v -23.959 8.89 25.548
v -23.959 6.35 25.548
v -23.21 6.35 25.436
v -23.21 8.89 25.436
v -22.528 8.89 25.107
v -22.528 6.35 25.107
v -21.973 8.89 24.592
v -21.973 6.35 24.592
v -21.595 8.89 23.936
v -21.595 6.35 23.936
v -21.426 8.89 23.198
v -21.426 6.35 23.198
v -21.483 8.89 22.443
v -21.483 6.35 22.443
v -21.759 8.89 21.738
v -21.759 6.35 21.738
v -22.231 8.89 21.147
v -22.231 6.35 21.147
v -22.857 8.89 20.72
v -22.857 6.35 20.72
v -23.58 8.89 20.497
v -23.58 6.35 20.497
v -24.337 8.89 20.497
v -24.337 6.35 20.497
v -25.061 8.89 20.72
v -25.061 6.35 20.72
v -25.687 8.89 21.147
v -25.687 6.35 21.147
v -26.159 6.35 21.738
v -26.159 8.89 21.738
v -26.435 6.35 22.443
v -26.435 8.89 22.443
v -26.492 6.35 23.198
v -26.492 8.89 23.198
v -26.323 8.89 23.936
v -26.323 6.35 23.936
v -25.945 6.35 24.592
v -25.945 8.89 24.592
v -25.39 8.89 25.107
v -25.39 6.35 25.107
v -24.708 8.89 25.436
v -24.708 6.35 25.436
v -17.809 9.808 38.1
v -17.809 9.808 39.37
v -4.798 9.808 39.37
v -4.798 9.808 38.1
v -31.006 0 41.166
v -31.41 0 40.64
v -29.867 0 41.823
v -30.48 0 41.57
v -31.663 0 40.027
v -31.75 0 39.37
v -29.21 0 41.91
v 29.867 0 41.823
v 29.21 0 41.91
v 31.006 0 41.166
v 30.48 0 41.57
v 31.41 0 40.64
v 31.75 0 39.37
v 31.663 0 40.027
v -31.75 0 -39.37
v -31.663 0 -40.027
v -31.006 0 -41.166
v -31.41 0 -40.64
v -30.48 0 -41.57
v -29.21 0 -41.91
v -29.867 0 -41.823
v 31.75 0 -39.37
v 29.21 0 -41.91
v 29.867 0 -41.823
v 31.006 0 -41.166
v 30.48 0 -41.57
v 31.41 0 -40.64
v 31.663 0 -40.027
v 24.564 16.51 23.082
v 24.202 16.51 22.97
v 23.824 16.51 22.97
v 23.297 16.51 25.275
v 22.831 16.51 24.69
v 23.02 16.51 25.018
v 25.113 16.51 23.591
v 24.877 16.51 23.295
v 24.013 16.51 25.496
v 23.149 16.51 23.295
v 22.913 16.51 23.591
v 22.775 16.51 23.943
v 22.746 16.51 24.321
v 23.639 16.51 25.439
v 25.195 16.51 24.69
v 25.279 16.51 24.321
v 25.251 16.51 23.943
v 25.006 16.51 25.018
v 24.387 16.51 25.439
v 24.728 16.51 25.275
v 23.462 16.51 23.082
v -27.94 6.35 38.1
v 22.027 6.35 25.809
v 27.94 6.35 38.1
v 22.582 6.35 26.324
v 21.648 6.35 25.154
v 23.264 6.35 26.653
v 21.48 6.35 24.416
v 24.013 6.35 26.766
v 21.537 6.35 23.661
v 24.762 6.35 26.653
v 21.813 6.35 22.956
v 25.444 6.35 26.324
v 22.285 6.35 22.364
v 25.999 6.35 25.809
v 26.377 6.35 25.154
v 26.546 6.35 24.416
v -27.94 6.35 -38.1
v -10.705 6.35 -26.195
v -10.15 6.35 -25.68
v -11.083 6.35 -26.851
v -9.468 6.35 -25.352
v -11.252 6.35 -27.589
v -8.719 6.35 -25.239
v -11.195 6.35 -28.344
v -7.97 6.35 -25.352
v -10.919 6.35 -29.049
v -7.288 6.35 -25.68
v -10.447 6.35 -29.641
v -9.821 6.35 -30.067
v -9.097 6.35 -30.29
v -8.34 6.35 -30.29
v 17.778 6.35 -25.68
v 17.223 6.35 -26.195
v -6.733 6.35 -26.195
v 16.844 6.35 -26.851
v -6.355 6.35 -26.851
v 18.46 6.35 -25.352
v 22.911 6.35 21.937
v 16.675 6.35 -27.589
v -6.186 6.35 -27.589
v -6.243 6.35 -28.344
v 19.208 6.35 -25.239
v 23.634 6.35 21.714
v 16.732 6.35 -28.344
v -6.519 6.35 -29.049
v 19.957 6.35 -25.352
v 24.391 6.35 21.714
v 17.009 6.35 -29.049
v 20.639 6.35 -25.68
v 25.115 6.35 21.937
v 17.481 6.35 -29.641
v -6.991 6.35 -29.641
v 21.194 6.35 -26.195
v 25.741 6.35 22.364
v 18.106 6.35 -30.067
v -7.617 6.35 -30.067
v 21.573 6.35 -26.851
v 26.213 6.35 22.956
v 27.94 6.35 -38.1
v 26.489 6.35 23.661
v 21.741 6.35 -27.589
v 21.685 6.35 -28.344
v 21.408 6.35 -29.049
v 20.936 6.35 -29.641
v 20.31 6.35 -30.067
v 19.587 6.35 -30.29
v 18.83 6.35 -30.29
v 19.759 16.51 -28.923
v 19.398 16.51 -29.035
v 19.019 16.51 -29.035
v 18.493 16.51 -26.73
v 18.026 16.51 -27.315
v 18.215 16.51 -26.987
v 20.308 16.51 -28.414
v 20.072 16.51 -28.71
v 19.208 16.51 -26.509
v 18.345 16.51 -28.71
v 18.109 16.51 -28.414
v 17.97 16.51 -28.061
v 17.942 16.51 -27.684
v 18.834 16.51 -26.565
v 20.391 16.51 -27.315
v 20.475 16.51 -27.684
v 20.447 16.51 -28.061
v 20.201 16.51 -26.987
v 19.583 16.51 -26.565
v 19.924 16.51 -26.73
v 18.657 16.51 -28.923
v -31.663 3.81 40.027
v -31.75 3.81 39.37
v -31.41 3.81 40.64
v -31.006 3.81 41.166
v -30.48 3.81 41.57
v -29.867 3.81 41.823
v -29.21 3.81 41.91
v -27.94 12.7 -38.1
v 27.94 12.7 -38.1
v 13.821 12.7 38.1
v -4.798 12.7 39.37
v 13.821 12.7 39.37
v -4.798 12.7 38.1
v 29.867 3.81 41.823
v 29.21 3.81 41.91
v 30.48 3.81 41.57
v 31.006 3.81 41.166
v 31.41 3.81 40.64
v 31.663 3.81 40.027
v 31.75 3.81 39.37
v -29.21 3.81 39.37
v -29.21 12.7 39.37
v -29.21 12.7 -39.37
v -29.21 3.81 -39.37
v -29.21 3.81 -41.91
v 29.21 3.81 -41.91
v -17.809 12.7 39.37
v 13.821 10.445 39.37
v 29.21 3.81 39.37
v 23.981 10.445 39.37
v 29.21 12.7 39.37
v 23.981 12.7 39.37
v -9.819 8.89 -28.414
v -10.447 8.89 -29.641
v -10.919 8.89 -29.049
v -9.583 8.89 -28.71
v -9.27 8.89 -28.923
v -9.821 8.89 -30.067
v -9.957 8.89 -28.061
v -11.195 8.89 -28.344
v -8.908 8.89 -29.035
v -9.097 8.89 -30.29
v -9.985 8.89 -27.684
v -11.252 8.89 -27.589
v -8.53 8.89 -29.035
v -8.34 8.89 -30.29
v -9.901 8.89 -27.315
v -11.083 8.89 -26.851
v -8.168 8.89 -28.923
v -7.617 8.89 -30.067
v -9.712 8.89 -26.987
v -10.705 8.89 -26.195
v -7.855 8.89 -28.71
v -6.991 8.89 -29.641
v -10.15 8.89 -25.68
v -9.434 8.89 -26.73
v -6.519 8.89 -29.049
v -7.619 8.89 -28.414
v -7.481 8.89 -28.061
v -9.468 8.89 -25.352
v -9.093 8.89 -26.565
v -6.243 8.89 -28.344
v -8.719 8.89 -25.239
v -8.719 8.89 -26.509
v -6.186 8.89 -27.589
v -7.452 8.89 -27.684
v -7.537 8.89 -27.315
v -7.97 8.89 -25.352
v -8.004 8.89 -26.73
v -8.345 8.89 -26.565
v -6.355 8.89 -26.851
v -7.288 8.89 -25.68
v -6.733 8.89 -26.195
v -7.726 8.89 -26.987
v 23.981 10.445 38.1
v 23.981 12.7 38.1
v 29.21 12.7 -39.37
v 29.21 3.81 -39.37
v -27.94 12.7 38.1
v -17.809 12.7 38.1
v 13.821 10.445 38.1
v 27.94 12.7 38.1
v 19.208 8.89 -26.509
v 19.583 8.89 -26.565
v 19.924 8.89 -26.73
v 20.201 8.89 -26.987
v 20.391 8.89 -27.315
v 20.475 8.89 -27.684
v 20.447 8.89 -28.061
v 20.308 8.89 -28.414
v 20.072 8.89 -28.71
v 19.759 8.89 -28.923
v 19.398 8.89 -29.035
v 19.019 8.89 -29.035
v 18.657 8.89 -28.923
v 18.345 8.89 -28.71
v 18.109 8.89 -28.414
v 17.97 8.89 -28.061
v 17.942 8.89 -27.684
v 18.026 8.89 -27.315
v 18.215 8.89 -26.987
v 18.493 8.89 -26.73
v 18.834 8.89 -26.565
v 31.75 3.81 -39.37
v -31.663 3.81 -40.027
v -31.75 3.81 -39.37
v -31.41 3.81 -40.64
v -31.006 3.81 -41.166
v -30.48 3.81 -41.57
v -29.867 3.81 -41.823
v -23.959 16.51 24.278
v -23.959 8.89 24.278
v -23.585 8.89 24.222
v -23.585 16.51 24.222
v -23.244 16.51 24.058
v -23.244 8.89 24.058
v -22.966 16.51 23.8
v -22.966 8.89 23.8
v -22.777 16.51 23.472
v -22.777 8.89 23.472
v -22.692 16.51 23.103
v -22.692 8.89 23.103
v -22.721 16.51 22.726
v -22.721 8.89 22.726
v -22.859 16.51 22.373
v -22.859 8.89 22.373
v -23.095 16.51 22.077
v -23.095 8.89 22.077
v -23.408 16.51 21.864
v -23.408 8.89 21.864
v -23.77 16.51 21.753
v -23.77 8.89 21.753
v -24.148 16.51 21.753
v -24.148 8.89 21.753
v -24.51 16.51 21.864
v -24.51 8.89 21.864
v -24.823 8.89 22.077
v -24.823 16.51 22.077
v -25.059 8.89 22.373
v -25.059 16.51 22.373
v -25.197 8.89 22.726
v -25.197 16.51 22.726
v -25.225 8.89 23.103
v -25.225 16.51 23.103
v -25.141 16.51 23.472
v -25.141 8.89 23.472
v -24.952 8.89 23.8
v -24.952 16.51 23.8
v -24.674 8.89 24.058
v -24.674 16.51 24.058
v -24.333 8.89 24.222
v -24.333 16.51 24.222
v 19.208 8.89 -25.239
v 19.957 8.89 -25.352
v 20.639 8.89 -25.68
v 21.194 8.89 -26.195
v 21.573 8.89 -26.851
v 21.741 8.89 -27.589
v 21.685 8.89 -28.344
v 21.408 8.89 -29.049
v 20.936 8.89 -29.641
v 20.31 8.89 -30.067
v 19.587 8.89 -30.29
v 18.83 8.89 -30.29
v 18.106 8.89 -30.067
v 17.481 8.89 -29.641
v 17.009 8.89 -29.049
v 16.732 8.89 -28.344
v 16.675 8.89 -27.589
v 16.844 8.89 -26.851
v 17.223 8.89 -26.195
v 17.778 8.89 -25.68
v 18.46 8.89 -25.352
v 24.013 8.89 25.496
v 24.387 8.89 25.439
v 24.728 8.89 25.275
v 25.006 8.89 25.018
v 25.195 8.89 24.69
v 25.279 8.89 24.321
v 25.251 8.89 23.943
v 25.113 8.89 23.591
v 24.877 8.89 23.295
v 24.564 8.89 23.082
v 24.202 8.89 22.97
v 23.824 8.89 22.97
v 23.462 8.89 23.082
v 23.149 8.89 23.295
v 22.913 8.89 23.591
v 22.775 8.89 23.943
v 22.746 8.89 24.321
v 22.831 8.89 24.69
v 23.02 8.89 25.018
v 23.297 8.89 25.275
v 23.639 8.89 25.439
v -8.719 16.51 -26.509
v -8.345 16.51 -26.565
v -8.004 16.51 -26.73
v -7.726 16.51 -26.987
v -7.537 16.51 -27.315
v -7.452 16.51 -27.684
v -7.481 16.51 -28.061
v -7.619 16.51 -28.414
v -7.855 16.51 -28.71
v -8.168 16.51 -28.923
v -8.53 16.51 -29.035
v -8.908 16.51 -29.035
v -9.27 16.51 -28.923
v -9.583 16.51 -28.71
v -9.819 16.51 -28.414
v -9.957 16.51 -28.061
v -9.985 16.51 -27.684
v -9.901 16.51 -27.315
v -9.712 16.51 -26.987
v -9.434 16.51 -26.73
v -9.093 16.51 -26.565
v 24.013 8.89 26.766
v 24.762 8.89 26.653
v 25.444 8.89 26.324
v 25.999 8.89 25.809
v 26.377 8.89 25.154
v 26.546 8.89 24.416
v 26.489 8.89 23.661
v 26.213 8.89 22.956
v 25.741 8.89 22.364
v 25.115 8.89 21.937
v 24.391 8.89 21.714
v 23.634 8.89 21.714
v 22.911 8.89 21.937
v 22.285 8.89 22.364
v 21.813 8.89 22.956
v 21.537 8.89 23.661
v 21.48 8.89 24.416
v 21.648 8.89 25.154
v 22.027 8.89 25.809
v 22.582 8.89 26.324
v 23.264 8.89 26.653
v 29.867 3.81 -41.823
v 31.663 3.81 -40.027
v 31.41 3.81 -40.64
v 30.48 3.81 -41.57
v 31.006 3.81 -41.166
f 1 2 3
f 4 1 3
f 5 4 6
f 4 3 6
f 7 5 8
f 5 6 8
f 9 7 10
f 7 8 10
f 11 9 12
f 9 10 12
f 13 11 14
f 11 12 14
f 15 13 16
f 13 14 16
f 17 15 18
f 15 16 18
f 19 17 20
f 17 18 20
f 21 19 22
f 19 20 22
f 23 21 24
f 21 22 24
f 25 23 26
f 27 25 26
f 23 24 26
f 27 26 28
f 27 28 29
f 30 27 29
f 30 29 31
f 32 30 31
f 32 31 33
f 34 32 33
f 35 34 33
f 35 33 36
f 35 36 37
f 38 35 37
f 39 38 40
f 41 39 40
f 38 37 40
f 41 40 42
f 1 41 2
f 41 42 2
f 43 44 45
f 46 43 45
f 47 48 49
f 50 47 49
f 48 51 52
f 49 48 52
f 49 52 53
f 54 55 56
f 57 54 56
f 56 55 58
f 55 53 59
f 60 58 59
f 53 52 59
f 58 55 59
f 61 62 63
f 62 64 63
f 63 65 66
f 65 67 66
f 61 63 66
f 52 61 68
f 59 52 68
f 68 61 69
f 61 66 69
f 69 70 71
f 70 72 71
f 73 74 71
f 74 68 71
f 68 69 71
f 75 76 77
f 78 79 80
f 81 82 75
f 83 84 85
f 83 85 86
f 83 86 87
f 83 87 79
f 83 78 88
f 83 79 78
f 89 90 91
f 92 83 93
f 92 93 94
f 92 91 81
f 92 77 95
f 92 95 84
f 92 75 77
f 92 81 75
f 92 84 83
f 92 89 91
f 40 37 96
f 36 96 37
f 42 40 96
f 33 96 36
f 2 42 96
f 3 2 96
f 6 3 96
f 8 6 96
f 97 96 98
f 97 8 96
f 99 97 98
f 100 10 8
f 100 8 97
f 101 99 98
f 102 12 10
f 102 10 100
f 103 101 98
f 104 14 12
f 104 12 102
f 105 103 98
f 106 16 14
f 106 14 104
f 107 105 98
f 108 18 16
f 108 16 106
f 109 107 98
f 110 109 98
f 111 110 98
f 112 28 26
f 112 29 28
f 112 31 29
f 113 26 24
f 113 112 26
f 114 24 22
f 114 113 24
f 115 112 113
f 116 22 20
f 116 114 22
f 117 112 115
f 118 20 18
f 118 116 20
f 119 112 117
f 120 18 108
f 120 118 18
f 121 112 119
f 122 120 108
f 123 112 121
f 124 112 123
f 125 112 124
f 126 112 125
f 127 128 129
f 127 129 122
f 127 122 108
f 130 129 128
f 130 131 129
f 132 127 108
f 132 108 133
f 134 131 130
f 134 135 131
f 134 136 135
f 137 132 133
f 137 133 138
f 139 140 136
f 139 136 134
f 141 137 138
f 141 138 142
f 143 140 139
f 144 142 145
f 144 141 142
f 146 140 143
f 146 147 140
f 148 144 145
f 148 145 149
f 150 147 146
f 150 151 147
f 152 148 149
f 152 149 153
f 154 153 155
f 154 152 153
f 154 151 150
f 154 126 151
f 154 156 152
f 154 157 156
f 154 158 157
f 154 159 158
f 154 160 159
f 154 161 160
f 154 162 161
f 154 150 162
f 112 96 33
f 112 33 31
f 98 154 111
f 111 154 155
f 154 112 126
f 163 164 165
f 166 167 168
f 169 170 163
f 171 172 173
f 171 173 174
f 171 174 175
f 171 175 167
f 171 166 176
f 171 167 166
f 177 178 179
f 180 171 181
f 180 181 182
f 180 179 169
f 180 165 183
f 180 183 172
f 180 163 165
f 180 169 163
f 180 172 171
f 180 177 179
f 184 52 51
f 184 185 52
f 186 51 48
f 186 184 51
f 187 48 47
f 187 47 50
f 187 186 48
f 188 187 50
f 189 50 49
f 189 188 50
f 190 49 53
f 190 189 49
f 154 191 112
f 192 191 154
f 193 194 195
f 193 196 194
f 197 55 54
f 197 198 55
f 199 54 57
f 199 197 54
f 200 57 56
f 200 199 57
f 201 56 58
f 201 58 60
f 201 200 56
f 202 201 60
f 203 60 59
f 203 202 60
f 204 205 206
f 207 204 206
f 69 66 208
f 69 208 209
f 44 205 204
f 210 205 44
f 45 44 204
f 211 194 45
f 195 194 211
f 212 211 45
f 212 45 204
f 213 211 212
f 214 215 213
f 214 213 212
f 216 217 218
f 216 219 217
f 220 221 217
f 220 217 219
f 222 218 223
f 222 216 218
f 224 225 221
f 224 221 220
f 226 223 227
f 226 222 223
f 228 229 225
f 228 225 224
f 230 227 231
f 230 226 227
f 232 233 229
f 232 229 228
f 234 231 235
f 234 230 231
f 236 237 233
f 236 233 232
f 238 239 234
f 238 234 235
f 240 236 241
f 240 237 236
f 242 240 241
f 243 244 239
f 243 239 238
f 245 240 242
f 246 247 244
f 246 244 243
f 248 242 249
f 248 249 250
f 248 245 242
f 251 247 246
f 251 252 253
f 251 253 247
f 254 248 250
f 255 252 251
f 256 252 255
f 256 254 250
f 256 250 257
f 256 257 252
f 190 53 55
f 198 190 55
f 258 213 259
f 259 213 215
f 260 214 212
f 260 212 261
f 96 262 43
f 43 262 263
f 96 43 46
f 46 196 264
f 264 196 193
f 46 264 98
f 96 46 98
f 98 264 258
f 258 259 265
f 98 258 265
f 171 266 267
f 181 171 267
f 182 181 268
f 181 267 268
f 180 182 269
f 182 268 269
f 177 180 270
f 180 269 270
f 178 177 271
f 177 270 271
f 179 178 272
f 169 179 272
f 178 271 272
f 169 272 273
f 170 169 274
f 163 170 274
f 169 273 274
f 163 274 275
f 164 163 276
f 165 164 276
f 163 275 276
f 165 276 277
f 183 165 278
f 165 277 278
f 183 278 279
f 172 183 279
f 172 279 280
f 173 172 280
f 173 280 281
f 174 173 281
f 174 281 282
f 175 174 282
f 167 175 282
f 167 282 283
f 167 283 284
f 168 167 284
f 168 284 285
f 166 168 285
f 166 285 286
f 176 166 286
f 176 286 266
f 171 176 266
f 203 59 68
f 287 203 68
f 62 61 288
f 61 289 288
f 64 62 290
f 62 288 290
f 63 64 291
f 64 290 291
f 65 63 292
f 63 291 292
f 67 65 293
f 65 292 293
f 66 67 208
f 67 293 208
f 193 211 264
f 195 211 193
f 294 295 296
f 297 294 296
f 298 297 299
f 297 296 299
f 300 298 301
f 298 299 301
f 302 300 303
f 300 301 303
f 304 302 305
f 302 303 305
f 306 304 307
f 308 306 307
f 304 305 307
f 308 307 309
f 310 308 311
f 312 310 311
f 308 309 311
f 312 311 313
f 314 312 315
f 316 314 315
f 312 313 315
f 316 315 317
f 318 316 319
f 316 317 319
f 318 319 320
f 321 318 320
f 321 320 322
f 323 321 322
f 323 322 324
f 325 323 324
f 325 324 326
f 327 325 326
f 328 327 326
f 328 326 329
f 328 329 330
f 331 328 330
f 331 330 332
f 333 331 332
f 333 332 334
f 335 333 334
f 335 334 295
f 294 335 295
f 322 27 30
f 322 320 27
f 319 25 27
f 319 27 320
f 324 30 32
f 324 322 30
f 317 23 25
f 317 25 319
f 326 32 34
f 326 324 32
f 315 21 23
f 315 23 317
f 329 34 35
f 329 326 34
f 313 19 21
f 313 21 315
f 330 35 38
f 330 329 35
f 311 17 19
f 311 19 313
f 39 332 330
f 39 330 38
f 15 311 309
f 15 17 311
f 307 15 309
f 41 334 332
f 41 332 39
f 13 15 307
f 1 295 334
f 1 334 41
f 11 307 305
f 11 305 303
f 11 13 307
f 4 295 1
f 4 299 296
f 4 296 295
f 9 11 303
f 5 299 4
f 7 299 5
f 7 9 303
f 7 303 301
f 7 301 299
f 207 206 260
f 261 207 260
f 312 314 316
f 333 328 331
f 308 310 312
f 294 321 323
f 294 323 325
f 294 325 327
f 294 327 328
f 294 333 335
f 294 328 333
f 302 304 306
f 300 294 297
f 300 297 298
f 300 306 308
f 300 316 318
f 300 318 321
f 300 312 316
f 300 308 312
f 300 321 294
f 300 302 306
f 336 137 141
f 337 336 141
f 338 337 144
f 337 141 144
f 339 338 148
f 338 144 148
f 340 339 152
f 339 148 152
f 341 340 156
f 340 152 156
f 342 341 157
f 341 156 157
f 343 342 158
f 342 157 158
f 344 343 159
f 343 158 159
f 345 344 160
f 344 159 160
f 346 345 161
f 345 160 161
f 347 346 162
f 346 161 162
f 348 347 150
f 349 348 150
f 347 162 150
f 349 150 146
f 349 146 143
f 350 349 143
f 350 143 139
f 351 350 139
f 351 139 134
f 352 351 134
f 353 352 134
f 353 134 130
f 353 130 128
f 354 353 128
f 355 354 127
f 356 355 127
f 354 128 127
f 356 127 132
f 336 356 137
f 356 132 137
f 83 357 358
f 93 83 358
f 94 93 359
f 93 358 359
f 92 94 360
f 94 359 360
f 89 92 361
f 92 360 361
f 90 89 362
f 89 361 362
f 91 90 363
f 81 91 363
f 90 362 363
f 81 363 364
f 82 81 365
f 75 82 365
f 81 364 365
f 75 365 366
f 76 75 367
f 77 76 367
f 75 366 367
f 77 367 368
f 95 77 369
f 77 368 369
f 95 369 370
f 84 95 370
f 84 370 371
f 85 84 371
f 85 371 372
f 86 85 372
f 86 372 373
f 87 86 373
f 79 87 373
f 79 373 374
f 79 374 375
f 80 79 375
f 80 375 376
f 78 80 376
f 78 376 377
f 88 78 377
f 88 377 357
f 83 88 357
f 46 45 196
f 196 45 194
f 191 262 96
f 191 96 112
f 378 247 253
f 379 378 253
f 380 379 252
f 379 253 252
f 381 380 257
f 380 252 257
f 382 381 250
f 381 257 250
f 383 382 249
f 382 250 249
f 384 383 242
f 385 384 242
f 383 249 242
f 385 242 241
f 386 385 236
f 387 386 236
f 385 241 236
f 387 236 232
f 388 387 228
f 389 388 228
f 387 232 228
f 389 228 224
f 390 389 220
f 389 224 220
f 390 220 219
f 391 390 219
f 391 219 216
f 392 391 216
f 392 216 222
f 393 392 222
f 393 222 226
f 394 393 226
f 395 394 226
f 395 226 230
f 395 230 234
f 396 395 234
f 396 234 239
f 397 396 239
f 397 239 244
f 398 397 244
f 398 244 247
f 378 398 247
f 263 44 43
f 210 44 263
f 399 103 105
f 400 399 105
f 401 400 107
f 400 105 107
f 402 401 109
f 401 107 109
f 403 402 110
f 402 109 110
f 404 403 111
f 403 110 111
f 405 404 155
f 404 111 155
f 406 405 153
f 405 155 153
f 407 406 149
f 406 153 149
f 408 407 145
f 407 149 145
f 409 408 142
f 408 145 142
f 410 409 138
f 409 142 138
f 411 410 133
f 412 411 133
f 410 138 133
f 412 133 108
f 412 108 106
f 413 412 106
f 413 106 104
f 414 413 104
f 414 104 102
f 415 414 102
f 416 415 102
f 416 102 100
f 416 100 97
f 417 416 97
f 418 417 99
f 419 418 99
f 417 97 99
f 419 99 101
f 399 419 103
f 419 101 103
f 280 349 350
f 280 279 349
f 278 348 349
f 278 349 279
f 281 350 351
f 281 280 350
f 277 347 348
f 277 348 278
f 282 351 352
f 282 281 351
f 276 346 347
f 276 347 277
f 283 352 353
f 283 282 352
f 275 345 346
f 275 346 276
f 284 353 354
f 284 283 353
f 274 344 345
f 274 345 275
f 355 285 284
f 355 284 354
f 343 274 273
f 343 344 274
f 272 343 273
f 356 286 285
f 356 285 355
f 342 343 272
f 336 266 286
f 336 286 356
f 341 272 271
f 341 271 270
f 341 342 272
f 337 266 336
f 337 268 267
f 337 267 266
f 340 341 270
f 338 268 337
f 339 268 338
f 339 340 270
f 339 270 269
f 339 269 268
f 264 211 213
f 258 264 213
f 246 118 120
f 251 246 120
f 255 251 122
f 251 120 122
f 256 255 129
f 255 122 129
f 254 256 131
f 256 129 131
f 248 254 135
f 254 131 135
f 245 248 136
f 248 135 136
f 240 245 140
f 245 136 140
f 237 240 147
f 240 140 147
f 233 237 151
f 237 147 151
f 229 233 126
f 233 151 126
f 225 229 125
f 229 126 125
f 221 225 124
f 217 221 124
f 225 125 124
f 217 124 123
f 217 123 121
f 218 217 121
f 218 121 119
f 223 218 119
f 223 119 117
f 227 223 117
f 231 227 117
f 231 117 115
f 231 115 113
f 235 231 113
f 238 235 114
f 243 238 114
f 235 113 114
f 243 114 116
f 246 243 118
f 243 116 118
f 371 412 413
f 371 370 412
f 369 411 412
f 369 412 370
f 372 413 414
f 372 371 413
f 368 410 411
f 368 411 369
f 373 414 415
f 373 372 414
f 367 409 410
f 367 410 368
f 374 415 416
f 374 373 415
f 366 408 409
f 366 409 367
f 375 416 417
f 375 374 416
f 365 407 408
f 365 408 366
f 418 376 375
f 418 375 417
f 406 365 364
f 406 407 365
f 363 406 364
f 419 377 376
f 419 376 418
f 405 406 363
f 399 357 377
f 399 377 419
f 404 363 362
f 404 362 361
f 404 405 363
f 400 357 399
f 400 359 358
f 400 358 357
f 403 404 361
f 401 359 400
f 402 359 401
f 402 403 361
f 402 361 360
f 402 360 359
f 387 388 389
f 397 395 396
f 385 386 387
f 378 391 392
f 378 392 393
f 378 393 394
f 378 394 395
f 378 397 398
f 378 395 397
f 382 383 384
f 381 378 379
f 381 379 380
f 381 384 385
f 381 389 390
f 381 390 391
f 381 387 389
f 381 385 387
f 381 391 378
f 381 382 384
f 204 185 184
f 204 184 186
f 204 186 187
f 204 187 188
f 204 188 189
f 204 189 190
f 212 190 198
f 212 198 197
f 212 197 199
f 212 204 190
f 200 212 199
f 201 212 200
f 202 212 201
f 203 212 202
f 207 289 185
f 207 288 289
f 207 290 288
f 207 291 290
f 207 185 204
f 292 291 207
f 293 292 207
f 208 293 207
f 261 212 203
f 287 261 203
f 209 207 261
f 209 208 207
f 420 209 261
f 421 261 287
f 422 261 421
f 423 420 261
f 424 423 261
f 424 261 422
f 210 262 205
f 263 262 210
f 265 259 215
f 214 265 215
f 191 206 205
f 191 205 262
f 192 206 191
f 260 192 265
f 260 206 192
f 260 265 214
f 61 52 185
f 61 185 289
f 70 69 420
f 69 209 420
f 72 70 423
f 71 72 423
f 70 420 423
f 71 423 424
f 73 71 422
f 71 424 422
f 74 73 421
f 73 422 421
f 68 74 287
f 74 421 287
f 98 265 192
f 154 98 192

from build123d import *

# Parameters (mm, degrees)
SKETCH1_W           = 63.5
SKETCH1_H           = 83.82
BOSS_EXTRUDE1_DEPTH = 12.7
SKETCH2_W           = 55.88
SKETCH2_H           = 76.2
CUT_EXTRUDE1_DEPTH  = 6.35
SKETCH3_W           = 63.5
SKETCH3_H           = 83.82
SKETCH3_W_2         = 58.42
SKETCH3_H_2         = 78.74
CUT_EXTRUDE2_DEPTH  = 8.89
SKETCH6_R           = 1.27
BOSS_EXTRUDE3_DEPTH = 10.16
SKETCH8_R           = 2.54
BOSS_EXTRUDE4_DEPTH = 2.54
SKETCH10_W          = 13.010391052
SKETCH10_H          = 3.325331773
CUT_EXTRUDE4_DEPTH  = 10.16
SKETCH11_W          = 10.16
SKETCH11_H          = 2.62905351
CUT_EXTRUDE5_DEPTH  = 10.16
FILLET1_R           = 2.54


with BuildPart() as part:
    # Sketch1 → Boss-Extrude1 (new body)
    with BuildSketch(Plane(origin=(0, 0, 0), x_dir=(1, 0, 0), z_dir=(0, 1, 0))):
        Rectangle(SKETCH1_W, SKETCH1_H)
    extrude(amount=BOSS_EXTRUDE1_DEPTH)

    # Sketch2 → Cut-Extrude1 (cut)
    with BuildSketch(Plane(origin=(0, 12.7, 0), x_dir=(1, 0, 0), z_dir=(0, 1, 0))):
        Rectangle(SKETCH2_W, SKETCH2_H)
    extrude(amount=-CUT_EXTRUDE1_DEPTH, mode=Mode.SUBTRACT)

    # Sketch3 → Cut-Extrude2 (cut)
    with BuildSketch(Plane(origin=(0, 12.7, 0), x_dir=(1, 0, 0), z_dir=(0, 1, 0))):
        Rectangle(SKETCH3_W, SKETCH3_H)
        Rectangle(SKETCH3_W_2, SKETCH3_H_2, mode=Mode.SUBTRACT)
    extrude(amount=-CUT_EXTRUDE2_DEPTH, mode=Mode.SUBTRACT)

    # Sketch6 → Boss-Extrude3 (add)
    with BuildSketch(Plane(origin=(0, 6.35, 0), x_dir=(1, 0, 0), z_dir=(0, 1, 0))):
        with Locations(Location((-23.958920987, -23.008465221, 0), (0, 0, 270))):
            Circle(SKETCH6_R)
        with Locations(Location((-8.718920987, 27.778834779, 0), (0, 0, 270))):
            Circle(SKETCH6_R)
        with Locations(Location((19.208379013, 27.778834779, 0), (0, 0, 270))):
            Circle(SKETCH6_R)
        with Locations(Location((24.012870789, -24.225811214, 0), (0, 0, 270))):
            Circle(SKETCH6_R)
    extrude(amount=BOSS_EXTRUDE3_DEPTH)

    # Sketch8 → Boss-Extrude4 (add)
    with BuildSketch(Plane(origin=(0, 6.35, 0), x_dir=(1, 0, 0), z_dir=(0, 1, 0))):
        with Locations(Location((19.208379013, 27.778834779, 0), (0, 0, 270))):
            Circle(SKETCH8_R)
        with Locations(Location((-8.718920987, 27.778834779, 0), (0, 0, 270))):
            Circle(SKETCH8_R)
        with Locations(Location((-23.958920987, -23.008465221, 0), (0, 0, 270))):
            Circle(SKETCH8_R)
        with Locations(Location((24.012870789, -24.225811214, 0), (0, 0, 270))):
            Circle(SKETCH8_R)
    extrude(amount=BOSS_EXTRUDE4_DEPTH)

    # Sketch10 → Cut-Extrude4 (cut)
    with BuildSketch(Plane.XY.offset(39.37)):
        with Locations((-11.303612935, 11.47098091)):
            Rectangle(SKETCH10_W, SKETCH10_H)
    extrude(amount=-CUT_EXTRUDE4_DEPTH, mode=Mode.SUBTRACT)

    # Sketch11 → Cut-Extrude5 (cut)
    with BuildSketch(Plane.XY.offset(39.37)):
        with Locations((18.901215122, 11.759143512)):
            Rectangle(SKETCH11_W, SKETCH11_H)
    extrude(amount=-CUT_EXTRUDE5_DEPTH, mode=Mode.SUBTRACT)

    # Fillet1
    fillet1_edges = [part.edges().sort_by_distance(p)[0] for p in [
        (31.75, 1.905, 41.91),
        (-31.75, 1.905, 41.91),
        (-31.75, 1.905, -41.91),
        (31.75, 1.905, -41.91),
    ]]
    fillet(fillet1_edges, radius=FILLET1_R)


solid = part.part
